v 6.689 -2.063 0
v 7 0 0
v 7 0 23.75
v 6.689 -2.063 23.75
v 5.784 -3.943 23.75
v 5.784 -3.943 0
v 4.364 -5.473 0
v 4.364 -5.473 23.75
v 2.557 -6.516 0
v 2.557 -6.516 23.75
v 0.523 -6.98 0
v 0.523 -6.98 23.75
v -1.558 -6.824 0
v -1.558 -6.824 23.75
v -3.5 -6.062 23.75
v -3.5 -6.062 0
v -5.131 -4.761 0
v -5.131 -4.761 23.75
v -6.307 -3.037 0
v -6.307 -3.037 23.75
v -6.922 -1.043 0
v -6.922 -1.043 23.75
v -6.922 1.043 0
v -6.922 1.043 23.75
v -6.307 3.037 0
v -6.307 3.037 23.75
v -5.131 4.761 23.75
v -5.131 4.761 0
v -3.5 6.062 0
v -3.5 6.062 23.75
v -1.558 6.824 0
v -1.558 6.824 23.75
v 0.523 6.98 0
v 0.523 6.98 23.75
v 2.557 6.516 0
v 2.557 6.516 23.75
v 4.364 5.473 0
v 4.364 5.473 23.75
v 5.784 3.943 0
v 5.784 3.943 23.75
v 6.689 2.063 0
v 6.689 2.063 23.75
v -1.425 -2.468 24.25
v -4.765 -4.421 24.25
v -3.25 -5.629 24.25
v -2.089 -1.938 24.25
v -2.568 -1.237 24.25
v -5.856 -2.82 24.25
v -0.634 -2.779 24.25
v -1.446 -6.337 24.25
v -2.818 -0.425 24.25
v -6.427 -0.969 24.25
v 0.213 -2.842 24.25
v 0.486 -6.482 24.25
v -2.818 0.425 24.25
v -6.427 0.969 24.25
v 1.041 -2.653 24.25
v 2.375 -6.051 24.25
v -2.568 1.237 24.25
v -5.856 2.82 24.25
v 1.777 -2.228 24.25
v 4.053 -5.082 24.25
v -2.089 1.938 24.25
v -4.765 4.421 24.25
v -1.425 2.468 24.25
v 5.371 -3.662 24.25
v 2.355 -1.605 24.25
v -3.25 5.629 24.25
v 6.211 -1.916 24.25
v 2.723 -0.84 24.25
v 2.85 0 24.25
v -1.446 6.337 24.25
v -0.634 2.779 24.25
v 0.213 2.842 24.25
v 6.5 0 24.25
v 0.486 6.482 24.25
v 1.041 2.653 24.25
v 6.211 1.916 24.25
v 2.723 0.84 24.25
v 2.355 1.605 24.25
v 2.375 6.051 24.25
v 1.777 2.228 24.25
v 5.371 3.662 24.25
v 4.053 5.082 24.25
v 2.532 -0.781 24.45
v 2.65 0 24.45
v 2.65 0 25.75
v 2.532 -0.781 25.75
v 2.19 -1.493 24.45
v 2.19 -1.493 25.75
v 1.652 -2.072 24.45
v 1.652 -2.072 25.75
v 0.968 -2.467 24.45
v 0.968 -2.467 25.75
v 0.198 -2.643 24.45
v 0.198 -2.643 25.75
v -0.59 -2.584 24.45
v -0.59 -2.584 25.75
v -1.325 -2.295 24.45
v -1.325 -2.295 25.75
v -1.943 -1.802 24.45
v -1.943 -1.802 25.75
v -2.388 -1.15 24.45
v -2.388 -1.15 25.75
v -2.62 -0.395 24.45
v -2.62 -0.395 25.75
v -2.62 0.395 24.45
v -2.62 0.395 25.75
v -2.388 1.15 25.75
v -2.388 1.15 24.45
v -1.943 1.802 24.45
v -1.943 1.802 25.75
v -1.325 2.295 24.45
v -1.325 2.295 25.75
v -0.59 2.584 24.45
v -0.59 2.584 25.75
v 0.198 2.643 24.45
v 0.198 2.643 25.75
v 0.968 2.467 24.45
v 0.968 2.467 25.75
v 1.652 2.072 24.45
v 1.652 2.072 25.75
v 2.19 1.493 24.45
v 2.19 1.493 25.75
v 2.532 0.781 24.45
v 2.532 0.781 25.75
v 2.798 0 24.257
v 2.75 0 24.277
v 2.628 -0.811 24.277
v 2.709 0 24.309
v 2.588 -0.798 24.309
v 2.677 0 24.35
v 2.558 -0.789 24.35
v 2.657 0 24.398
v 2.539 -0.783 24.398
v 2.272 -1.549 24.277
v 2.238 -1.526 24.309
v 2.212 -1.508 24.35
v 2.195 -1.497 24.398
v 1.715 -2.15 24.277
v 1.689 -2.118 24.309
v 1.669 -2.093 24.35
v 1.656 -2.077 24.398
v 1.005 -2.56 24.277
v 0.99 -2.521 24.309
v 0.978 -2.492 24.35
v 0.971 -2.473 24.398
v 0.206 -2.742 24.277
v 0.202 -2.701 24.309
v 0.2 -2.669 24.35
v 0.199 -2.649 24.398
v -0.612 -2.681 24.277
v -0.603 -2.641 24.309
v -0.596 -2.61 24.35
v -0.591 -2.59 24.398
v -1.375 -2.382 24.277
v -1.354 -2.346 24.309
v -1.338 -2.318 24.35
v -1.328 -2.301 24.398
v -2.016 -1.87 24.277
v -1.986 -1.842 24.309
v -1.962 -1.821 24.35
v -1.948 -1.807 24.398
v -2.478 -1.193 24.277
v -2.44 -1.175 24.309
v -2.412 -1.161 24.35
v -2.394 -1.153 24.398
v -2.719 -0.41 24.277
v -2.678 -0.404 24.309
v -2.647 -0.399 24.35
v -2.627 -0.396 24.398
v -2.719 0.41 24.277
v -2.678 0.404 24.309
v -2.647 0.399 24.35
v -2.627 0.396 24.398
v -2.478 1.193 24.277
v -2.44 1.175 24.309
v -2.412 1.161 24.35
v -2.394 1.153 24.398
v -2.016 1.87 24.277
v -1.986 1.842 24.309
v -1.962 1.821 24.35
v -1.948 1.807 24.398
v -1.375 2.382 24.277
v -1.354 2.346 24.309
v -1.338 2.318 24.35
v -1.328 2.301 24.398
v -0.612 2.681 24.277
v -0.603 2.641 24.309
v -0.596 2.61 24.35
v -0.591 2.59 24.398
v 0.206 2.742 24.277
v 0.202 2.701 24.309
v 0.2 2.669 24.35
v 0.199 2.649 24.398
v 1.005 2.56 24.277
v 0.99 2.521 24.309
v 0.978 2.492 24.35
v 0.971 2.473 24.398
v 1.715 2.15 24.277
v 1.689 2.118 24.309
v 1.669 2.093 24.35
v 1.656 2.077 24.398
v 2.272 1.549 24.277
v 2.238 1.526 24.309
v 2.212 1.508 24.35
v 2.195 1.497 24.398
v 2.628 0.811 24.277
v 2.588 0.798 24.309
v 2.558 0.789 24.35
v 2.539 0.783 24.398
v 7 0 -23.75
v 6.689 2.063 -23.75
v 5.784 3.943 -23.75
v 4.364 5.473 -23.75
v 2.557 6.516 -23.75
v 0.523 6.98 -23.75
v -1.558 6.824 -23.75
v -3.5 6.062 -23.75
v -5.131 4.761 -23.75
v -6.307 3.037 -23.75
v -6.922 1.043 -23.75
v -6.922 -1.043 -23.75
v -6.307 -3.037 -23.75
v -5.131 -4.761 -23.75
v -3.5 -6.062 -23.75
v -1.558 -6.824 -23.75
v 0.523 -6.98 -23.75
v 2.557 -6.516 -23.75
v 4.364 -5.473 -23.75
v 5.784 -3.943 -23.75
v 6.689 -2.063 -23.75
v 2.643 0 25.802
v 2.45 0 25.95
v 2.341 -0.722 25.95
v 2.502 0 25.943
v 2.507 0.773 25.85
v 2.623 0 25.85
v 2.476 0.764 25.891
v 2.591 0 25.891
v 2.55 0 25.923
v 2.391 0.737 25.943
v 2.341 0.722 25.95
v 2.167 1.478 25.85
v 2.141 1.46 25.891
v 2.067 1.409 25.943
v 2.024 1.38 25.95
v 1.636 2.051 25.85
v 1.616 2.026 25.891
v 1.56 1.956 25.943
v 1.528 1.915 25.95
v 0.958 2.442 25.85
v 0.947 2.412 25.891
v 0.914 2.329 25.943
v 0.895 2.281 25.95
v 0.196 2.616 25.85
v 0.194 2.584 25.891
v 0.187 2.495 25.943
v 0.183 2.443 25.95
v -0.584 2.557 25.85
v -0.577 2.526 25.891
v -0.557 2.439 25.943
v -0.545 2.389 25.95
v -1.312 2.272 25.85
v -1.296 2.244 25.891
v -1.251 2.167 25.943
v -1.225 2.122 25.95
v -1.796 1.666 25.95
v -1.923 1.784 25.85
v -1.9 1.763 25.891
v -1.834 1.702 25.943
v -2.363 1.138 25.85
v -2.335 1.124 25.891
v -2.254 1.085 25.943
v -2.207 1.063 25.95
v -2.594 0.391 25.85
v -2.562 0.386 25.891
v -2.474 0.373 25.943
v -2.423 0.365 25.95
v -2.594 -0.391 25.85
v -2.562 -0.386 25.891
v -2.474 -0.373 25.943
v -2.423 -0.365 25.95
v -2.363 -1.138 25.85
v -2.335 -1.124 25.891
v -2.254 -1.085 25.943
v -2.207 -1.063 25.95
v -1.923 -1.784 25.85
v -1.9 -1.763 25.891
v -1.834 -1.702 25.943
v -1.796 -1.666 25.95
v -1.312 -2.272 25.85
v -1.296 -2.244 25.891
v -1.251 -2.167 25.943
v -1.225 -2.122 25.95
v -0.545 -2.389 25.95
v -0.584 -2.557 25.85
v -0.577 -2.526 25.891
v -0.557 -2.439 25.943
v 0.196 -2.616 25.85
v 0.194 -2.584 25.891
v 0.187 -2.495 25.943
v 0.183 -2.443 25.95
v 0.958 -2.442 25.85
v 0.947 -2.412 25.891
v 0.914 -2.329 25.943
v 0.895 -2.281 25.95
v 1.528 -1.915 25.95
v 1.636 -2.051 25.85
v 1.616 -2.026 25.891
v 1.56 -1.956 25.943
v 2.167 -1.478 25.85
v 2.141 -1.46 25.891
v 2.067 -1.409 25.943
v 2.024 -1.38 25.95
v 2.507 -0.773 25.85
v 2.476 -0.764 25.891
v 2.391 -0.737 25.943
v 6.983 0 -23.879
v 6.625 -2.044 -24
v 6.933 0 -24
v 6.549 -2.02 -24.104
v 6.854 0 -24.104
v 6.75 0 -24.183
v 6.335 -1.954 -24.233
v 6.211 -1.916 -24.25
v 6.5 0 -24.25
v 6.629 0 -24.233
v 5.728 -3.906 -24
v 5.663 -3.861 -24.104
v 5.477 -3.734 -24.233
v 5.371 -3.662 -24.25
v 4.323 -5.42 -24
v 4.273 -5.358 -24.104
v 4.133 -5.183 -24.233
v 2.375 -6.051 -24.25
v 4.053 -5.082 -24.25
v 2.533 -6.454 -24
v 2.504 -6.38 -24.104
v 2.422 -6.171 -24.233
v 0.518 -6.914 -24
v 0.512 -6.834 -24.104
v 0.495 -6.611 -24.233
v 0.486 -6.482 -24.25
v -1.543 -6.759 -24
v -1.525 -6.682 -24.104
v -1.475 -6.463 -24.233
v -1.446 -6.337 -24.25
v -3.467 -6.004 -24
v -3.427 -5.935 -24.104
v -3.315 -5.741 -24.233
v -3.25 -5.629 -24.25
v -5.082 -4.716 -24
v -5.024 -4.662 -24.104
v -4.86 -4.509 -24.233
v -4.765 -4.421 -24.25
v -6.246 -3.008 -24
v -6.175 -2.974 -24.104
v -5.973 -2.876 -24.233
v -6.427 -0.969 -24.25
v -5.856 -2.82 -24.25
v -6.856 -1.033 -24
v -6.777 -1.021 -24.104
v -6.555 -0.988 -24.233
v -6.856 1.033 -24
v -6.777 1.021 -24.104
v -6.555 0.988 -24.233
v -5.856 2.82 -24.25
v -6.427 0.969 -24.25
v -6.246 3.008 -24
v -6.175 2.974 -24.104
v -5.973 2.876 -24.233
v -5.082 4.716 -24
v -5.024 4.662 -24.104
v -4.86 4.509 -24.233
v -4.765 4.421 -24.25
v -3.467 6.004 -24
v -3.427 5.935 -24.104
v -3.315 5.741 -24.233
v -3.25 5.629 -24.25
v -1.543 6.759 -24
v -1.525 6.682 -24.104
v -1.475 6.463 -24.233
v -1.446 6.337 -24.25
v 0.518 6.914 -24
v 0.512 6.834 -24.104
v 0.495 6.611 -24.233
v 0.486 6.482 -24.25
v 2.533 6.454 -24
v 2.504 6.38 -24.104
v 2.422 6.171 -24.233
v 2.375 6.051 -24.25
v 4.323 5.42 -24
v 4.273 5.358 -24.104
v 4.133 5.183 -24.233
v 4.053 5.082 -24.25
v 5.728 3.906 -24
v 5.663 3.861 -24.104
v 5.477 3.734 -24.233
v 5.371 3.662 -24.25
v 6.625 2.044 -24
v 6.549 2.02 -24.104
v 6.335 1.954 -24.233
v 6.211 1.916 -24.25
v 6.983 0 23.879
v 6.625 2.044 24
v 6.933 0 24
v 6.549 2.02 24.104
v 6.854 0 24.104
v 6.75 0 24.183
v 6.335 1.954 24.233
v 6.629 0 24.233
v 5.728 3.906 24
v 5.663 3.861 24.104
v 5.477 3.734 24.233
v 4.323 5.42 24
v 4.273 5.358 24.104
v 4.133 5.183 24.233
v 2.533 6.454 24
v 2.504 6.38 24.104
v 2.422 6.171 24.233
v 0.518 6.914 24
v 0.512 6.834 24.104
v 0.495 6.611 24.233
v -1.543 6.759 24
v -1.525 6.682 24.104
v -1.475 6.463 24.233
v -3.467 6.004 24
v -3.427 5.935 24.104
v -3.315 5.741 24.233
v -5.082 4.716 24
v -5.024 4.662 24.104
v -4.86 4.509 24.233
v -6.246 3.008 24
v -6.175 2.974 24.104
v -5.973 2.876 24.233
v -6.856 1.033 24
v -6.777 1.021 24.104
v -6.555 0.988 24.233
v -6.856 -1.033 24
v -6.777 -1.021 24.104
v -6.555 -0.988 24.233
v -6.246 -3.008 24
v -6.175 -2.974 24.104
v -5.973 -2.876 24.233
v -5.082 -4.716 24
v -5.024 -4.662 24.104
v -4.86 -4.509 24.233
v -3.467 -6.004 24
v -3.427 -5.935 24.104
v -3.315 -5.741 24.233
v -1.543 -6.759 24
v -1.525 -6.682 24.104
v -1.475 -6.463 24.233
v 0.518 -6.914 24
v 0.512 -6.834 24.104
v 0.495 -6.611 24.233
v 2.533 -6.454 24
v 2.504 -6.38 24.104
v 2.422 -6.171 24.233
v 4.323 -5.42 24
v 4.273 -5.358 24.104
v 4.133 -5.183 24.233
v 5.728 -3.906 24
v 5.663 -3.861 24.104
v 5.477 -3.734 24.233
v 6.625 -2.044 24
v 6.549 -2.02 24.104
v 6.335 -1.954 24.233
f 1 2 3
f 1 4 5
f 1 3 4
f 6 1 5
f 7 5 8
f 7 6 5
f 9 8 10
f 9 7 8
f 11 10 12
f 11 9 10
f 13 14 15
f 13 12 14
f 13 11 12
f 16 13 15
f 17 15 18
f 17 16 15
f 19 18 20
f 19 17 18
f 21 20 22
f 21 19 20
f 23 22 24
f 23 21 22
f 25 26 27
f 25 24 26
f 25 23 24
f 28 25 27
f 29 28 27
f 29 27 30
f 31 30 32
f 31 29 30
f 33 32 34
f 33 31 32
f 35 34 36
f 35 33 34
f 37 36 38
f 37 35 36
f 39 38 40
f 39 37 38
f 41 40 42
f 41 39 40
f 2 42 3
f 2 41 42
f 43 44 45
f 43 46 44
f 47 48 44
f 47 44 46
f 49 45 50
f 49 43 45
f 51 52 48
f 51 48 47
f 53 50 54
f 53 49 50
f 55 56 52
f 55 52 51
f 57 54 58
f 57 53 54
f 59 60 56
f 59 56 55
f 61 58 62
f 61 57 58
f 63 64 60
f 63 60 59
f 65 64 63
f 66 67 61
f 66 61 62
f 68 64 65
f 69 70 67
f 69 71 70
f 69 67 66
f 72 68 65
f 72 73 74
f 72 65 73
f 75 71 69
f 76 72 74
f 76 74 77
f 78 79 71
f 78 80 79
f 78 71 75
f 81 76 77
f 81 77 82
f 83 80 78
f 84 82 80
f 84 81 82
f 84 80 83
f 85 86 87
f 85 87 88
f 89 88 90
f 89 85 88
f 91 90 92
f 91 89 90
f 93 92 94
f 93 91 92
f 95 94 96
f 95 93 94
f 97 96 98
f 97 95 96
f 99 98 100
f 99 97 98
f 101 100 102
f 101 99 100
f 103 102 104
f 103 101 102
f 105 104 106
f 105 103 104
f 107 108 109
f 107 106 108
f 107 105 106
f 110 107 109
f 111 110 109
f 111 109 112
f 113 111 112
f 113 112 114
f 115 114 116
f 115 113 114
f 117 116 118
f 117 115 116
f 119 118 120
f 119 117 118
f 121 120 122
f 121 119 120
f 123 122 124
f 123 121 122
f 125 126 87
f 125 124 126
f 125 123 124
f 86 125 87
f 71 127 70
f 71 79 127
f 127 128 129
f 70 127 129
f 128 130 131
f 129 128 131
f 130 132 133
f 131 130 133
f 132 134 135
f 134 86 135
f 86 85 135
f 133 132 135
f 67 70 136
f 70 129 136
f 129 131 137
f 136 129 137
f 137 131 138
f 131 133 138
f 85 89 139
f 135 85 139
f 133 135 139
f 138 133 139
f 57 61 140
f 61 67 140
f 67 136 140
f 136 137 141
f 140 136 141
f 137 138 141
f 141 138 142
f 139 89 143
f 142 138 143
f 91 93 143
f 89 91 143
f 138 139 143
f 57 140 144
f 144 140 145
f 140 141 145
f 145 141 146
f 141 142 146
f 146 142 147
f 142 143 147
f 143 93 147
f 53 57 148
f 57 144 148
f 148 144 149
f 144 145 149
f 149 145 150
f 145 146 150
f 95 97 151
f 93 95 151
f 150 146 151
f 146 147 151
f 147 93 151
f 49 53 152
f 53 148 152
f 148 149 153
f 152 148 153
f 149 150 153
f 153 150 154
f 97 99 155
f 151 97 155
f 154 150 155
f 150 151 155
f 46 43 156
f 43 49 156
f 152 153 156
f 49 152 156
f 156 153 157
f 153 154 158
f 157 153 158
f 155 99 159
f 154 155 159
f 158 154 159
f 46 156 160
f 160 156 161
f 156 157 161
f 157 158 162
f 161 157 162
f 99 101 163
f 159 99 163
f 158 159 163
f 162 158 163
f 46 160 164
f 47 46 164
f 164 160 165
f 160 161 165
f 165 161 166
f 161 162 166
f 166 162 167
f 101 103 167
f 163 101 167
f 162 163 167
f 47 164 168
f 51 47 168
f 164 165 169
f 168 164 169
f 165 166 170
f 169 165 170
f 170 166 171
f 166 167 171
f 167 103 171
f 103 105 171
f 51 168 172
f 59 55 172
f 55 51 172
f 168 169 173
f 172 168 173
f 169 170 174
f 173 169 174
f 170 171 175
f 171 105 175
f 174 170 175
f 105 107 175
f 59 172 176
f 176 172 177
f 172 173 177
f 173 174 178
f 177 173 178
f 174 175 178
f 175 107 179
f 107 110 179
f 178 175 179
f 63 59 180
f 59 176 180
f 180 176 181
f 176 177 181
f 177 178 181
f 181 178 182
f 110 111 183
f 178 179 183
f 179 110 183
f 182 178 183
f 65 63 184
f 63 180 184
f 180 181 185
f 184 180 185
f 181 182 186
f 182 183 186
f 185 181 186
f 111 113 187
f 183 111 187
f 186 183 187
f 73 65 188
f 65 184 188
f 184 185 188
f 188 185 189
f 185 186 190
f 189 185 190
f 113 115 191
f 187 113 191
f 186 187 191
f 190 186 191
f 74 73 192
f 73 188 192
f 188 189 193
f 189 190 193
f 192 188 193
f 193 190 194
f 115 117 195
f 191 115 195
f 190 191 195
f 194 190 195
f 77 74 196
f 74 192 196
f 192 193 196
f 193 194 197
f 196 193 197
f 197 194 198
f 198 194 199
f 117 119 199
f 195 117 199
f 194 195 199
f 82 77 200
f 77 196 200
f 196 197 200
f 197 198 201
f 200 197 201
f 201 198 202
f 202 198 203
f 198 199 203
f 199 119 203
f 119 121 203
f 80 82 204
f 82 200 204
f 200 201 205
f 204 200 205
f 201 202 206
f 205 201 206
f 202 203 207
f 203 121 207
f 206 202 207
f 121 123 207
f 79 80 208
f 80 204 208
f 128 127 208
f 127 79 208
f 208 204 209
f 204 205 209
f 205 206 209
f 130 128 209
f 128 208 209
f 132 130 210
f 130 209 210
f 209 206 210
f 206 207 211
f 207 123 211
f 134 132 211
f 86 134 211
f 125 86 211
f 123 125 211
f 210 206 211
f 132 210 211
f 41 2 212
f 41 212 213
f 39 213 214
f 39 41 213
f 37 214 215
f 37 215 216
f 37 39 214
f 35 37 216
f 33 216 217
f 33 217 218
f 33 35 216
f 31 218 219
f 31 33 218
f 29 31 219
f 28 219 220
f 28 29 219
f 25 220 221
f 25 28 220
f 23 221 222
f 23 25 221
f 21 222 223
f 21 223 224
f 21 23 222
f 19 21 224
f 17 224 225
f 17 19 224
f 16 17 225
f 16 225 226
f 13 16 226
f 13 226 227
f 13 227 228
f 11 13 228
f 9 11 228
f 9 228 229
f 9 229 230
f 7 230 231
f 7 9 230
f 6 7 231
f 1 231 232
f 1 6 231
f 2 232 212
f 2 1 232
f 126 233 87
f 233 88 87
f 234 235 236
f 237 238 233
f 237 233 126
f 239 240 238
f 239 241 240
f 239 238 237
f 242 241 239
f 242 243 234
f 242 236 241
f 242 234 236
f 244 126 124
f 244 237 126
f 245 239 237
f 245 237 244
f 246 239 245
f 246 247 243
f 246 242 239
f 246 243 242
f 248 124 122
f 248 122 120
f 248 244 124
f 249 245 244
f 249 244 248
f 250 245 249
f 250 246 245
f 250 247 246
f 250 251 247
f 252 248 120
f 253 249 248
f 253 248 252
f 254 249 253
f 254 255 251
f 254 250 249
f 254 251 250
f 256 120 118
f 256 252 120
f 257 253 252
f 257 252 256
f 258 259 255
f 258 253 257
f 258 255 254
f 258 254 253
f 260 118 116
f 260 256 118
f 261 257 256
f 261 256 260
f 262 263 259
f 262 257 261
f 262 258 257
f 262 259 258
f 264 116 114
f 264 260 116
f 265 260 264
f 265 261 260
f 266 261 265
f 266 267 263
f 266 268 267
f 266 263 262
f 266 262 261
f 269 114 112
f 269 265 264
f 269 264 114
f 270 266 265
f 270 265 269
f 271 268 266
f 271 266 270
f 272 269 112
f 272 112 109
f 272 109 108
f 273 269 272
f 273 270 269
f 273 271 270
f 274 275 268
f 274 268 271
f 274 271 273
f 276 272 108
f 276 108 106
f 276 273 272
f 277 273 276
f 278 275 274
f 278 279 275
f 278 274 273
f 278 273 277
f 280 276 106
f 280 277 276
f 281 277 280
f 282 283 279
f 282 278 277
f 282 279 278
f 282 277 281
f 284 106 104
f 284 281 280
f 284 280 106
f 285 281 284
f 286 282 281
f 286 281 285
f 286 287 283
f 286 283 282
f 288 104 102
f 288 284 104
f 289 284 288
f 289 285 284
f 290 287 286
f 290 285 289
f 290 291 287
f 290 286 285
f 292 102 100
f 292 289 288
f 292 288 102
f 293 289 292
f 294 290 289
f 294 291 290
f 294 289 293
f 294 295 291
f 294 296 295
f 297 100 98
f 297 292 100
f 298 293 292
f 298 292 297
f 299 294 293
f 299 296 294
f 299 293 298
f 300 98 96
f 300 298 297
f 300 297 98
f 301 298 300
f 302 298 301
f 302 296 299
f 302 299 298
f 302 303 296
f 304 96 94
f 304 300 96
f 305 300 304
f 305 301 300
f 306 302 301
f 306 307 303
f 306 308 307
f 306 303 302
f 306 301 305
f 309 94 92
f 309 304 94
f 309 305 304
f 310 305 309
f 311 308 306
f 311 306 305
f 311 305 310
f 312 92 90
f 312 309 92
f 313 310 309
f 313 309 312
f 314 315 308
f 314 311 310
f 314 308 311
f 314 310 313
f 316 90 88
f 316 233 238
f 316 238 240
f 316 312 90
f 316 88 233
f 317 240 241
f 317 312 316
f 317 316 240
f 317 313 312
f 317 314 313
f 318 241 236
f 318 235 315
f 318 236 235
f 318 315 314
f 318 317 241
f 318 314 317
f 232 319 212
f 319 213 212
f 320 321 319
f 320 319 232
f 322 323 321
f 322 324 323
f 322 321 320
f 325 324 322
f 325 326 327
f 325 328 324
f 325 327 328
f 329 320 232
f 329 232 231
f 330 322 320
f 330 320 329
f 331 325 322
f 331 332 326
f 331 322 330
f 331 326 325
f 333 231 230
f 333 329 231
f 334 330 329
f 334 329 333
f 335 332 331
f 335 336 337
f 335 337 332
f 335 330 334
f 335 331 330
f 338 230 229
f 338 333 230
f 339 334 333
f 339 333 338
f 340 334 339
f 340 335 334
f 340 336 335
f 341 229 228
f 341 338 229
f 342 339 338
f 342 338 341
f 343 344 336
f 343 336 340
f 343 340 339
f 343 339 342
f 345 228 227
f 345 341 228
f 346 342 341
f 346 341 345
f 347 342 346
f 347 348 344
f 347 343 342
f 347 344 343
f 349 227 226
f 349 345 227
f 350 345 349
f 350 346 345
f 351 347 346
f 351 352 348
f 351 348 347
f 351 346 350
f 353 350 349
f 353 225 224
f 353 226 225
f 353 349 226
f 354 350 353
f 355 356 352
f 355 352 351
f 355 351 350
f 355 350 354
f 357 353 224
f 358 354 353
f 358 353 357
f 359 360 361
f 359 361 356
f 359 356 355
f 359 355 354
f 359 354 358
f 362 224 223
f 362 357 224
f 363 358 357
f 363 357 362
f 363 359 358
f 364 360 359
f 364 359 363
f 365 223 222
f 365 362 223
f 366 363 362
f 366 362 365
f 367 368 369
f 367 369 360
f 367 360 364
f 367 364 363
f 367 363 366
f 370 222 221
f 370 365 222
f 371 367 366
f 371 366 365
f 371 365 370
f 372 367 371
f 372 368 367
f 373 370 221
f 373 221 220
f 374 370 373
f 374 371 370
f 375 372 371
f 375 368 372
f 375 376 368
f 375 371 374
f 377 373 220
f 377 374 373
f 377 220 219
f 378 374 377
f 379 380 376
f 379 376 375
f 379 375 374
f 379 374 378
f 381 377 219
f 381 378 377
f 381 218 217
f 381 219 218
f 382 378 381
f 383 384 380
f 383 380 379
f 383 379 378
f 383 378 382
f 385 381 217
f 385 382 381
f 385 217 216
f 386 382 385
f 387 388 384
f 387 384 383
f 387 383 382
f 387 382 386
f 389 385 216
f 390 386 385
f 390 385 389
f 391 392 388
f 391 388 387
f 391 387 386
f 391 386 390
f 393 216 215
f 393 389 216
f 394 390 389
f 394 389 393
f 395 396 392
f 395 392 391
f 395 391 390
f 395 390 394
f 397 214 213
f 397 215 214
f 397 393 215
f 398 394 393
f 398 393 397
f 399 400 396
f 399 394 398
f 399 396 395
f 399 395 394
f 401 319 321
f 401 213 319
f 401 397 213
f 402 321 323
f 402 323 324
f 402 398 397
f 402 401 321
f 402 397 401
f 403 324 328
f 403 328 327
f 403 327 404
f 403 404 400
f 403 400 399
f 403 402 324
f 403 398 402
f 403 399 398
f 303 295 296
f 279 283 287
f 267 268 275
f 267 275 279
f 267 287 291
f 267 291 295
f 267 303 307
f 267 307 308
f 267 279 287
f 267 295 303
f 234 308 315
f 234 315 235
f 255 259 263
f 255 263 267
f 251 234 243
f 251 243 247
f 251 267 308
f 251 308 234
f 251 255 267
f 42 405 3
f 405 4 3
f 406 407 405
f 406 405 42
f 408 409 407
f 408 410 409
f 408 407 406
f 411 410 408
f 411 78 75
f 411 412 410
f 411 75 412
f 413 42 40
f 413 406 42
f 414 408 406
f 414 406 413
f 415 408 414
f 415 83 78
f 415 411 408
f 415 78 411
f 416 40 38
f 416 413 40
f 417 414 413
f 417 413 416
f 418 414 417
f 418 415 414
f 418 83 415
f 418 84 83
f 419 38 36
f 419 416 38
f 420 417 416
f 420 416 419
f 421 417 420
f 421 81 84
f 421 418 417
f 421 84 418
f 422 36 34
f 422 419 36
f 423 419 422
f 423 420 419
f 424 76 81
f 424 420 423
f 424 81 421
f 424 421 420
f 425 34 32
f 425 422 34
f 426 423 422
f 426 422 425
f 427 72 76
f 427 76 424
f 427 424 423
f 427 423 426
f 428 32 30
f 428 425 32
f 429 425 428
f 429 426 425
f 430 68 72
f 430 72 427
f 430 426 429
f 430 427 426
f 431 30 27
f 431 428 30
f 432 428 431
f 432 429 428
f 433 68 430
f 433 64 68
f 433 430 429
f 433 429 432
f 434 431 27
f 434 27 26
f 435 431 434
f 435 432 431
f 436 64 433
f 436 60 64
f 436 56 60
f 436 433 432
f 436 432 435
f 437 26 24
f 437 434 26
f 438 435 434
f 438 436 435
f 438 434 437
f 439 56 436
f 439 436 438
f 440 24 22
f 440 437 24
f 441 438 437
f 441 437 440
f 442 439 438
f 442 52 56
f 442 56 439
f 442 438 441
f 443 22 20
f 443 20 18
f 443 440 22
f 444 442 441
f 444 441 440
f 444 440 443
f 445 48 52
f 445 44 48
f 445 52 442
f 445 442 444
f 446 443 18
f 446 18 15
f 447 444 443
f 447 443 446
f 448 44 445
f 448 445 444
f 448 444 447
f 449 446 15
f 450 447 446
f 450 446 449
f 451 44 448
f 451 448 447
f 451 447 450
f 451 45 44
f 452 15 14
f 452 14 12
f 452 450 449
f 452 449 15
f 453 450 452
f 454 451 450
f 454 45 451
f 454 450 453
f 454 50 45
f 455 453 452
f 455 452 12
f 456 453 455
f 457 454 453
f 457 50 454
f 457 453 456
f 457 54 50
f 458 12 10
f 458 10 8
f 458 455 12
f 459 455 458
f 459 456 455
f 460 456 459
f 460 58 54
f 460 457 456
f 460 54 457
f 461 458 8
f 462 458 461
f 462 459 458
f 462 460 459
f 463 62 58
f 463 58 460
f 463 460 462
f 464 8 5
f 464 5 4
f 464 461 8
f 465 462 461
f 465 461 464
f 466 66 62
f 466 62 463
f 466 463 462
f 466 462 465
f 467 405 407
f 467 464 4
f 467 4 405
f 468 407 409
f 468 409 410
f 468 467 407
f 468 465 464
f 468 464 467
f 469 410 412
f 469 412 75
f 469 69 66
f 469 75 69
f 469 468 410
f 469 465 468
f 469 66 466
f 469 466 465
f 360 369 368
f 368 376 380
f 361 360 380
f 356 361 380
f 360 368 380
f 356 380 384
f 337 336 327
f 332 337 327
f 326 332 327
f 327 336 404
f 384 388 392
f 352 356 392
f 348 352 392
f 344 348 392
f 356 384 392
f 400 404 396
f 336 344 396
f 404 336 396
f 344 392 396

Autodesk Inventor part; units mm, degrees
ref_plane "YZ Plane" through (0, 0, 0) normal (1, 0, 0) x (0, 1, 0)
ref_plane "XZ Plane" through (0, 0, 0) normal (0, 1, 0) x (-1, 0, 0)
ref_plane "XY Plane" through (0, 0, 0) normal (0, 0, 1) x (1, 0, 0)
sketch "スケッチ1" plane through (0, 0, 0) normal (0, 0, 1) x (1, 0, 0)
  circle A0 centre (0, 0) radius 7
  dimension "d0" = 14
extrude "押し出し1" add sketch "スケッチ1" along normal mid plane 48.5
sketch "スケッチ2" plane through (0, 0, 24.25) normal (0, 0, 1) x (1, 0, 0)
  circle A0 centre (0, 0) radius 2.65
  dimension "d3" = 5.3
extrude "押し出し2" add sketch "スケッチ2" along normal blind 1.7
fillet "フィレット1" radius 0.5 2 edges at (-7, 0, 24.25) (-7, 0, -24.25)
fillet "フィレット2" radius 0.2 2 edges at (-2.65, 0, 25.95) (-2.65, 0, 24.25)
properties part number "AA_Battery"
